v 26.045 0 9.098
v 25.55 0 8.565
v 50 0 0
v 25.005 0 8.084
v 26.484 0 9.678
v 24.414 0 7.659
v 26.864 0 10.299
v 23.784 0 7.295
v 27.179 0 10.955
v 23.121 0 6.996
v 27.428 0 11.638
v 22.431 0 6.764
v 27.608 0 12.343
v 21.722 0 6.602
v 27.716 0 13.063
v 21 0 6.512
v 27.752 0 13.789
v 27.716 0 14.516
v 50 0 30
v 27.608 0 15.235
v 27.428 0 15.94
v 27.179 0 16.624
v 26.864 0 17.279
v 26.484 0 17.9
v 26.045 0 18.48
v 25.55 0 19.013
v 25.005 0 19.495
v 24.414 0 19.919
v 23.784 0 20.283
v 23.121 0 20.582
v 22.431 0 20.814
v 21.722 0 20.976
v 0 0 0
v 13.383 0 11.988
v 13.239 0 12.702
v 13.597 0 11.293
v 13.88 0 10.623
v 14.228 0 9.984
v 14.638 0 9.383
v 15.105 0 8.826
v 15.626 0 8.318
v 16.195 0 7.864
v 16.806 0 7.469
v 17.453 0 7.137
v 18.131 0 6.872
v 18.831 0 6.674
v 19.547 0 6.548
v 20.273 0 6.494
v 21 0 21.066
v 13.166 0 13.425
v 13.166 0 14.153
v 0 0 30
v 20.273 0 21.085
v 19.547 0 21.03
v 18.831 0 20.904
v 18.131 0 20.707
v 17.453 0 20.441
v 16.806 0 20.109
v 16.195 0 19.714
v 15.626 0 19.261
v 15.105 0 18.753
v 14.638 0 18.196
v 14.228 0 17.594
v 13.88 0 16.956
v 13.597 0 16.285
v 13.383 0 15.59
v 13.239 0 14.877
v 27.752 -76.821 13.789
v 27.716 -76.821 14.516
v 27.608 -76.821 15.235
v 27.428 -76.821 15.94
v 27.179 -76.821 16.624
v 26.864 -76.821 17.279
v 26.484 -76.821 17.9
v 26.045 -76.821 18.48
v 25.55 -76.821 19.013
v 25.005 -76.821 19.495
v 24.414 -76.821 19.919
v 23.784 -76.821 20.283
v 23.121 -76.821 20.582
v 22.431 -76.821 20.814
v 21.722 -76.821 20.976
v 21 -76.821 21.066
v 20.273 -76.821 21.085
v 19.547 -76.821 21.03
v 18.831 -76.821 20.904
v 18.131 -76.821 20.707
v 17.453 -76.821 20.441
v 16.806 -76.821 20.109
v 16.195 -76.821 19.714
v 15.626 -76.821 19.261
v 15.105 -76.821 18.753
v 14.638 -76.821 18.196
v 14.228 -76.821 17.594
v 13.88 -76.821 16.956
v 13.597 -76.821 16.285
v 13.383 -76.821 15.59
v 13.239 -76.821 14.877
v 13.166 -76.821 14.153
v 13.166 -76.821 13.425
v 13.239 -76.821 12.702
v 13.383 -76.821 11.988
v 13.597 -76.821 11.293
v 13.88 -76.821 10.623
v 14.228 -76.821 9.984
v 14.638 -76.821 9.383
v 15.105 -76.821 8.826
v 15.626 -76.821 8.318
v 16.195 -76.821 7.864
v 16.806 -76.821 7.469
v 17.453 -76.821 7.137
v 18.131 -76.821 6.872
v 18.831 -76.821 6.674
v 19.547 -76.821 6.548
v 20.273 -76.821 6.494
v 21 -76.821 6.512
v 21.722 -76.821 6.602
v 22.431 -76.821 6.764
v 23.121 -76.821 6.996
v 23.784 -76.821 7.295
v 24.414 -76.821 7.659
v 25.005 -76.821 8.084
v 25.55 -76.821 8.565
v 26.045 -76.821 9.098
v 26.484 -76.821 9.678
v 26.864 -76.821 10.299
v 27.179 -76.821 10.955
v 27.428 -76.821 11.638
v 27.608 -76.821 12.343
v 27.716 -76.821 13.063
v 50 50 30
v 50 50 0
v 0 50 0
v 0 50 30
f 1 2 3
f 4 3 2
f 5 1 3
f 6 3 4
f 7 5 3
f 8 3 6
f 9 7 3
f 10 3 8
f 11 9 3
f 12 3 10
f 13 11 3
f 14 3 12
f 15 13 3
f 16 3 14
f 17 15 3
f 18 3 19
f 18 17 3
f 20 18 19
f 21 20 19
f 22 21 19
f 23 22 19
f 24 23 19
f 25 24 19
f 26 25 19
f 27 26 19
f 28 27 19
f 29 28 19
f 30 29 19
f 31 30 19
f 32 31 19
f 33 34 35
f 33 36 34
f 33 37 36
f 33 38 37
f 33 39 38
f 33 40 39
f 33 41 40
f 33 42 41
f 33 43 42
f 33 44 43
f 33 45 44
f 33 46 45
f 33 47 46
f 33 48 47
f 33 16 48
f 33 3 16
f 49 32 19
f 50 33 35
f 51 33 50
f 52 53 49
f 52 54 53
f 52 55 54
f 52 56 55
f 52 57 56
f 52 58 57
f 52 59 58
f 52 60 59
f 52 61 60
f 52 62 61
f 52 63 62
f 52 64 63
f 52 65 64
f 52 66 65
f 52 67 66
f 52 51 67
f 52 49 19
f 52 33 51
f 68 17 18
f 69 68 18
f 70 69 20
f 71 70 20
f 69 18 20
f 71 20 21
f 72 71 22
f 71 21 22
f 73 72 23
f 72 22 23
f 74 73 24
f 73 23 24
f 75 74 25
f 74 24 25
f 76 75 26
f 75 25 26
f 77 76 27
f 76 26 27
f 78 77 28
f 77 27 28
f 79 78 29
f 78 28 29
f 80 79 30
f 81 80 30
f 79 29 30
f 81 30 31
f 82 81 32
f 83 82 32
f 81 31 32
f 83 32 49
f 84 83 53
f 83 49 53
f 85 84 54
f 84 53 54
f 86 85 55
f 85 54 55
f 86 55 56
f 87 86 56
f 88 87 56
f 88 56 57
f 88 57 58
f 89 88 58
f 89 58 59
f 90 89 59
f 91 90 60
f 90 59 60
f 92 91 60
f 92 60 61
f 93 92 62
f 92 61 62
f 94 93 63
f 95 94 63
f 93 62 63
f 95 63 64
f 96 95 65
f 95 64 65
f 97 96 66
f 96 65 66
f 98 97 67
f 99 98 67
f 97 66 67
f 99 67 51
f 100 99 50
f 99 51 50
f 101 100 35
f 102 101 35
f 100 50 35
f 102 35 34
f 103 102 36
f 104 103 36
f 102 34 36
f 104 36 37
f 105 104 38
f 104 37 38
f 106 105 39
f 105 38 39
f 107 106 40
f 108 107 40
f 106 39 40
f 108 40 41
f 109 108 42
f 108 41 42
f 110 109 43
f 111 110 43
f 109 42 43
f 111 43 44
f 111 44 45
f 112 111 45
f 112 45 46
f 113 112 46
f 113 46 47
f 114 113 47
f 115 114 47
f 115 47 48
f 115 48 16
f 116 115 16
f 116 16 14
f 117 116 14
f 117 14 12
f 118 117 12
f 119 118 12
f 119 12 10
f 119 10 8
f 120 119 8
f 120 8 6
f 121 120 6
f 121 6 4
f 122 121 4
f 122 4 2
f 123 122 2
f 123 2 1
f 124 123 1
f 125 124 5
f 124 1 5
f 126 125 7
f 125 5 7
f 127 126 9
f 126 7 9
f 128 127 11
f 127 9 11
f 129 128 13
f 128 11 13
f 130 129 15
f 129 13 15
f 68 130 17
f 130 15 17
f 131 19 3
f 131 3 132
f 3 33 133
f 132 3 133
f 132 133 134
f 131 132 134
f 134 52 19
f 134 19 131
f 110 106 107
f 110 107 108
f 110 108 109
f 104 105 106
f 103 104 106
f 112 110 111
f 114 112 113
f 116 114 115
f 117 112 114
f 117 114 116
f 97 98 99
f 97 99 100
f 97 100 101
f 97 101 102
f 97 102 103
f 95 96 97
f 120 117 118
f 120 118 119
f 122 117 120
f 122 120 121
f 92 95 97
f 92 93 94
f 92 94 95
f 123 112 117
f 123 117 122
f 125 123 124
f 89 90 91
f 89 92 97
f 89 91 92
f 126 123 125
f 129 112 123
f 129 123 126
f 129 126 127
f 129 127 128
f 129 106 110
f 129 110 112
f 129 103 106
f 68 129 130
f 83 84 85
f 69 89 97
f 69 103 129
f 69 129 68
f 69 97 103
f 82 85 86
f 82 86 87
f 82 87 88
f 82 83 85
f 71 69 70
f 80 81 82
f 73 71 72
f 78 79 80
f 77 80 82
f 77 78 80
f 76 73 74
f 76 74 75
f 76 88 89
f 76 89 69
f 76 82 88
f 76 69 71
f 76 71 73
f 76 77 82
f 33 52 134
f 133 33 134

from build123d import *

# Parameters (mm, degrees)
F1_W     = 50
F1_H     = 30
F2_DEPTH = 50
F3_R     = 7.2976744804
F4_DEPTH = 76.8214575
F5_DEPTH = 116.5


# Not quite as in the source:
# - an extrude ends at something that could not be found from the text; its depth is read off the source's solid


with BuildPart() as f2:
    # F1 (on Right) → F2 (new body)
    with BuildSketch(Plane.YZ):
        with Locations((25, 15)):
            Rectangle(F1_W, F1_H)
    extrude(amount=F2_DEPTH)

    # F3 (on face) → F4 (join, through all)
    with BuildSketch(Plane.XZ):
        with Locations((20.4548016191, 13.7891862541)):
            Circle(F3_R)
    extrude(amount=F4_DEPTH)

    # F5 (add): a face of the model
    f5_faces = [f2.faces().sort_by_distance(p)[0] for p in [
        (20.4548016191, -76.8214575, 13.7891862541),
    ]]
    extrude(f5_faces, amount=-F5_DEPTH)


solid = f2.part
